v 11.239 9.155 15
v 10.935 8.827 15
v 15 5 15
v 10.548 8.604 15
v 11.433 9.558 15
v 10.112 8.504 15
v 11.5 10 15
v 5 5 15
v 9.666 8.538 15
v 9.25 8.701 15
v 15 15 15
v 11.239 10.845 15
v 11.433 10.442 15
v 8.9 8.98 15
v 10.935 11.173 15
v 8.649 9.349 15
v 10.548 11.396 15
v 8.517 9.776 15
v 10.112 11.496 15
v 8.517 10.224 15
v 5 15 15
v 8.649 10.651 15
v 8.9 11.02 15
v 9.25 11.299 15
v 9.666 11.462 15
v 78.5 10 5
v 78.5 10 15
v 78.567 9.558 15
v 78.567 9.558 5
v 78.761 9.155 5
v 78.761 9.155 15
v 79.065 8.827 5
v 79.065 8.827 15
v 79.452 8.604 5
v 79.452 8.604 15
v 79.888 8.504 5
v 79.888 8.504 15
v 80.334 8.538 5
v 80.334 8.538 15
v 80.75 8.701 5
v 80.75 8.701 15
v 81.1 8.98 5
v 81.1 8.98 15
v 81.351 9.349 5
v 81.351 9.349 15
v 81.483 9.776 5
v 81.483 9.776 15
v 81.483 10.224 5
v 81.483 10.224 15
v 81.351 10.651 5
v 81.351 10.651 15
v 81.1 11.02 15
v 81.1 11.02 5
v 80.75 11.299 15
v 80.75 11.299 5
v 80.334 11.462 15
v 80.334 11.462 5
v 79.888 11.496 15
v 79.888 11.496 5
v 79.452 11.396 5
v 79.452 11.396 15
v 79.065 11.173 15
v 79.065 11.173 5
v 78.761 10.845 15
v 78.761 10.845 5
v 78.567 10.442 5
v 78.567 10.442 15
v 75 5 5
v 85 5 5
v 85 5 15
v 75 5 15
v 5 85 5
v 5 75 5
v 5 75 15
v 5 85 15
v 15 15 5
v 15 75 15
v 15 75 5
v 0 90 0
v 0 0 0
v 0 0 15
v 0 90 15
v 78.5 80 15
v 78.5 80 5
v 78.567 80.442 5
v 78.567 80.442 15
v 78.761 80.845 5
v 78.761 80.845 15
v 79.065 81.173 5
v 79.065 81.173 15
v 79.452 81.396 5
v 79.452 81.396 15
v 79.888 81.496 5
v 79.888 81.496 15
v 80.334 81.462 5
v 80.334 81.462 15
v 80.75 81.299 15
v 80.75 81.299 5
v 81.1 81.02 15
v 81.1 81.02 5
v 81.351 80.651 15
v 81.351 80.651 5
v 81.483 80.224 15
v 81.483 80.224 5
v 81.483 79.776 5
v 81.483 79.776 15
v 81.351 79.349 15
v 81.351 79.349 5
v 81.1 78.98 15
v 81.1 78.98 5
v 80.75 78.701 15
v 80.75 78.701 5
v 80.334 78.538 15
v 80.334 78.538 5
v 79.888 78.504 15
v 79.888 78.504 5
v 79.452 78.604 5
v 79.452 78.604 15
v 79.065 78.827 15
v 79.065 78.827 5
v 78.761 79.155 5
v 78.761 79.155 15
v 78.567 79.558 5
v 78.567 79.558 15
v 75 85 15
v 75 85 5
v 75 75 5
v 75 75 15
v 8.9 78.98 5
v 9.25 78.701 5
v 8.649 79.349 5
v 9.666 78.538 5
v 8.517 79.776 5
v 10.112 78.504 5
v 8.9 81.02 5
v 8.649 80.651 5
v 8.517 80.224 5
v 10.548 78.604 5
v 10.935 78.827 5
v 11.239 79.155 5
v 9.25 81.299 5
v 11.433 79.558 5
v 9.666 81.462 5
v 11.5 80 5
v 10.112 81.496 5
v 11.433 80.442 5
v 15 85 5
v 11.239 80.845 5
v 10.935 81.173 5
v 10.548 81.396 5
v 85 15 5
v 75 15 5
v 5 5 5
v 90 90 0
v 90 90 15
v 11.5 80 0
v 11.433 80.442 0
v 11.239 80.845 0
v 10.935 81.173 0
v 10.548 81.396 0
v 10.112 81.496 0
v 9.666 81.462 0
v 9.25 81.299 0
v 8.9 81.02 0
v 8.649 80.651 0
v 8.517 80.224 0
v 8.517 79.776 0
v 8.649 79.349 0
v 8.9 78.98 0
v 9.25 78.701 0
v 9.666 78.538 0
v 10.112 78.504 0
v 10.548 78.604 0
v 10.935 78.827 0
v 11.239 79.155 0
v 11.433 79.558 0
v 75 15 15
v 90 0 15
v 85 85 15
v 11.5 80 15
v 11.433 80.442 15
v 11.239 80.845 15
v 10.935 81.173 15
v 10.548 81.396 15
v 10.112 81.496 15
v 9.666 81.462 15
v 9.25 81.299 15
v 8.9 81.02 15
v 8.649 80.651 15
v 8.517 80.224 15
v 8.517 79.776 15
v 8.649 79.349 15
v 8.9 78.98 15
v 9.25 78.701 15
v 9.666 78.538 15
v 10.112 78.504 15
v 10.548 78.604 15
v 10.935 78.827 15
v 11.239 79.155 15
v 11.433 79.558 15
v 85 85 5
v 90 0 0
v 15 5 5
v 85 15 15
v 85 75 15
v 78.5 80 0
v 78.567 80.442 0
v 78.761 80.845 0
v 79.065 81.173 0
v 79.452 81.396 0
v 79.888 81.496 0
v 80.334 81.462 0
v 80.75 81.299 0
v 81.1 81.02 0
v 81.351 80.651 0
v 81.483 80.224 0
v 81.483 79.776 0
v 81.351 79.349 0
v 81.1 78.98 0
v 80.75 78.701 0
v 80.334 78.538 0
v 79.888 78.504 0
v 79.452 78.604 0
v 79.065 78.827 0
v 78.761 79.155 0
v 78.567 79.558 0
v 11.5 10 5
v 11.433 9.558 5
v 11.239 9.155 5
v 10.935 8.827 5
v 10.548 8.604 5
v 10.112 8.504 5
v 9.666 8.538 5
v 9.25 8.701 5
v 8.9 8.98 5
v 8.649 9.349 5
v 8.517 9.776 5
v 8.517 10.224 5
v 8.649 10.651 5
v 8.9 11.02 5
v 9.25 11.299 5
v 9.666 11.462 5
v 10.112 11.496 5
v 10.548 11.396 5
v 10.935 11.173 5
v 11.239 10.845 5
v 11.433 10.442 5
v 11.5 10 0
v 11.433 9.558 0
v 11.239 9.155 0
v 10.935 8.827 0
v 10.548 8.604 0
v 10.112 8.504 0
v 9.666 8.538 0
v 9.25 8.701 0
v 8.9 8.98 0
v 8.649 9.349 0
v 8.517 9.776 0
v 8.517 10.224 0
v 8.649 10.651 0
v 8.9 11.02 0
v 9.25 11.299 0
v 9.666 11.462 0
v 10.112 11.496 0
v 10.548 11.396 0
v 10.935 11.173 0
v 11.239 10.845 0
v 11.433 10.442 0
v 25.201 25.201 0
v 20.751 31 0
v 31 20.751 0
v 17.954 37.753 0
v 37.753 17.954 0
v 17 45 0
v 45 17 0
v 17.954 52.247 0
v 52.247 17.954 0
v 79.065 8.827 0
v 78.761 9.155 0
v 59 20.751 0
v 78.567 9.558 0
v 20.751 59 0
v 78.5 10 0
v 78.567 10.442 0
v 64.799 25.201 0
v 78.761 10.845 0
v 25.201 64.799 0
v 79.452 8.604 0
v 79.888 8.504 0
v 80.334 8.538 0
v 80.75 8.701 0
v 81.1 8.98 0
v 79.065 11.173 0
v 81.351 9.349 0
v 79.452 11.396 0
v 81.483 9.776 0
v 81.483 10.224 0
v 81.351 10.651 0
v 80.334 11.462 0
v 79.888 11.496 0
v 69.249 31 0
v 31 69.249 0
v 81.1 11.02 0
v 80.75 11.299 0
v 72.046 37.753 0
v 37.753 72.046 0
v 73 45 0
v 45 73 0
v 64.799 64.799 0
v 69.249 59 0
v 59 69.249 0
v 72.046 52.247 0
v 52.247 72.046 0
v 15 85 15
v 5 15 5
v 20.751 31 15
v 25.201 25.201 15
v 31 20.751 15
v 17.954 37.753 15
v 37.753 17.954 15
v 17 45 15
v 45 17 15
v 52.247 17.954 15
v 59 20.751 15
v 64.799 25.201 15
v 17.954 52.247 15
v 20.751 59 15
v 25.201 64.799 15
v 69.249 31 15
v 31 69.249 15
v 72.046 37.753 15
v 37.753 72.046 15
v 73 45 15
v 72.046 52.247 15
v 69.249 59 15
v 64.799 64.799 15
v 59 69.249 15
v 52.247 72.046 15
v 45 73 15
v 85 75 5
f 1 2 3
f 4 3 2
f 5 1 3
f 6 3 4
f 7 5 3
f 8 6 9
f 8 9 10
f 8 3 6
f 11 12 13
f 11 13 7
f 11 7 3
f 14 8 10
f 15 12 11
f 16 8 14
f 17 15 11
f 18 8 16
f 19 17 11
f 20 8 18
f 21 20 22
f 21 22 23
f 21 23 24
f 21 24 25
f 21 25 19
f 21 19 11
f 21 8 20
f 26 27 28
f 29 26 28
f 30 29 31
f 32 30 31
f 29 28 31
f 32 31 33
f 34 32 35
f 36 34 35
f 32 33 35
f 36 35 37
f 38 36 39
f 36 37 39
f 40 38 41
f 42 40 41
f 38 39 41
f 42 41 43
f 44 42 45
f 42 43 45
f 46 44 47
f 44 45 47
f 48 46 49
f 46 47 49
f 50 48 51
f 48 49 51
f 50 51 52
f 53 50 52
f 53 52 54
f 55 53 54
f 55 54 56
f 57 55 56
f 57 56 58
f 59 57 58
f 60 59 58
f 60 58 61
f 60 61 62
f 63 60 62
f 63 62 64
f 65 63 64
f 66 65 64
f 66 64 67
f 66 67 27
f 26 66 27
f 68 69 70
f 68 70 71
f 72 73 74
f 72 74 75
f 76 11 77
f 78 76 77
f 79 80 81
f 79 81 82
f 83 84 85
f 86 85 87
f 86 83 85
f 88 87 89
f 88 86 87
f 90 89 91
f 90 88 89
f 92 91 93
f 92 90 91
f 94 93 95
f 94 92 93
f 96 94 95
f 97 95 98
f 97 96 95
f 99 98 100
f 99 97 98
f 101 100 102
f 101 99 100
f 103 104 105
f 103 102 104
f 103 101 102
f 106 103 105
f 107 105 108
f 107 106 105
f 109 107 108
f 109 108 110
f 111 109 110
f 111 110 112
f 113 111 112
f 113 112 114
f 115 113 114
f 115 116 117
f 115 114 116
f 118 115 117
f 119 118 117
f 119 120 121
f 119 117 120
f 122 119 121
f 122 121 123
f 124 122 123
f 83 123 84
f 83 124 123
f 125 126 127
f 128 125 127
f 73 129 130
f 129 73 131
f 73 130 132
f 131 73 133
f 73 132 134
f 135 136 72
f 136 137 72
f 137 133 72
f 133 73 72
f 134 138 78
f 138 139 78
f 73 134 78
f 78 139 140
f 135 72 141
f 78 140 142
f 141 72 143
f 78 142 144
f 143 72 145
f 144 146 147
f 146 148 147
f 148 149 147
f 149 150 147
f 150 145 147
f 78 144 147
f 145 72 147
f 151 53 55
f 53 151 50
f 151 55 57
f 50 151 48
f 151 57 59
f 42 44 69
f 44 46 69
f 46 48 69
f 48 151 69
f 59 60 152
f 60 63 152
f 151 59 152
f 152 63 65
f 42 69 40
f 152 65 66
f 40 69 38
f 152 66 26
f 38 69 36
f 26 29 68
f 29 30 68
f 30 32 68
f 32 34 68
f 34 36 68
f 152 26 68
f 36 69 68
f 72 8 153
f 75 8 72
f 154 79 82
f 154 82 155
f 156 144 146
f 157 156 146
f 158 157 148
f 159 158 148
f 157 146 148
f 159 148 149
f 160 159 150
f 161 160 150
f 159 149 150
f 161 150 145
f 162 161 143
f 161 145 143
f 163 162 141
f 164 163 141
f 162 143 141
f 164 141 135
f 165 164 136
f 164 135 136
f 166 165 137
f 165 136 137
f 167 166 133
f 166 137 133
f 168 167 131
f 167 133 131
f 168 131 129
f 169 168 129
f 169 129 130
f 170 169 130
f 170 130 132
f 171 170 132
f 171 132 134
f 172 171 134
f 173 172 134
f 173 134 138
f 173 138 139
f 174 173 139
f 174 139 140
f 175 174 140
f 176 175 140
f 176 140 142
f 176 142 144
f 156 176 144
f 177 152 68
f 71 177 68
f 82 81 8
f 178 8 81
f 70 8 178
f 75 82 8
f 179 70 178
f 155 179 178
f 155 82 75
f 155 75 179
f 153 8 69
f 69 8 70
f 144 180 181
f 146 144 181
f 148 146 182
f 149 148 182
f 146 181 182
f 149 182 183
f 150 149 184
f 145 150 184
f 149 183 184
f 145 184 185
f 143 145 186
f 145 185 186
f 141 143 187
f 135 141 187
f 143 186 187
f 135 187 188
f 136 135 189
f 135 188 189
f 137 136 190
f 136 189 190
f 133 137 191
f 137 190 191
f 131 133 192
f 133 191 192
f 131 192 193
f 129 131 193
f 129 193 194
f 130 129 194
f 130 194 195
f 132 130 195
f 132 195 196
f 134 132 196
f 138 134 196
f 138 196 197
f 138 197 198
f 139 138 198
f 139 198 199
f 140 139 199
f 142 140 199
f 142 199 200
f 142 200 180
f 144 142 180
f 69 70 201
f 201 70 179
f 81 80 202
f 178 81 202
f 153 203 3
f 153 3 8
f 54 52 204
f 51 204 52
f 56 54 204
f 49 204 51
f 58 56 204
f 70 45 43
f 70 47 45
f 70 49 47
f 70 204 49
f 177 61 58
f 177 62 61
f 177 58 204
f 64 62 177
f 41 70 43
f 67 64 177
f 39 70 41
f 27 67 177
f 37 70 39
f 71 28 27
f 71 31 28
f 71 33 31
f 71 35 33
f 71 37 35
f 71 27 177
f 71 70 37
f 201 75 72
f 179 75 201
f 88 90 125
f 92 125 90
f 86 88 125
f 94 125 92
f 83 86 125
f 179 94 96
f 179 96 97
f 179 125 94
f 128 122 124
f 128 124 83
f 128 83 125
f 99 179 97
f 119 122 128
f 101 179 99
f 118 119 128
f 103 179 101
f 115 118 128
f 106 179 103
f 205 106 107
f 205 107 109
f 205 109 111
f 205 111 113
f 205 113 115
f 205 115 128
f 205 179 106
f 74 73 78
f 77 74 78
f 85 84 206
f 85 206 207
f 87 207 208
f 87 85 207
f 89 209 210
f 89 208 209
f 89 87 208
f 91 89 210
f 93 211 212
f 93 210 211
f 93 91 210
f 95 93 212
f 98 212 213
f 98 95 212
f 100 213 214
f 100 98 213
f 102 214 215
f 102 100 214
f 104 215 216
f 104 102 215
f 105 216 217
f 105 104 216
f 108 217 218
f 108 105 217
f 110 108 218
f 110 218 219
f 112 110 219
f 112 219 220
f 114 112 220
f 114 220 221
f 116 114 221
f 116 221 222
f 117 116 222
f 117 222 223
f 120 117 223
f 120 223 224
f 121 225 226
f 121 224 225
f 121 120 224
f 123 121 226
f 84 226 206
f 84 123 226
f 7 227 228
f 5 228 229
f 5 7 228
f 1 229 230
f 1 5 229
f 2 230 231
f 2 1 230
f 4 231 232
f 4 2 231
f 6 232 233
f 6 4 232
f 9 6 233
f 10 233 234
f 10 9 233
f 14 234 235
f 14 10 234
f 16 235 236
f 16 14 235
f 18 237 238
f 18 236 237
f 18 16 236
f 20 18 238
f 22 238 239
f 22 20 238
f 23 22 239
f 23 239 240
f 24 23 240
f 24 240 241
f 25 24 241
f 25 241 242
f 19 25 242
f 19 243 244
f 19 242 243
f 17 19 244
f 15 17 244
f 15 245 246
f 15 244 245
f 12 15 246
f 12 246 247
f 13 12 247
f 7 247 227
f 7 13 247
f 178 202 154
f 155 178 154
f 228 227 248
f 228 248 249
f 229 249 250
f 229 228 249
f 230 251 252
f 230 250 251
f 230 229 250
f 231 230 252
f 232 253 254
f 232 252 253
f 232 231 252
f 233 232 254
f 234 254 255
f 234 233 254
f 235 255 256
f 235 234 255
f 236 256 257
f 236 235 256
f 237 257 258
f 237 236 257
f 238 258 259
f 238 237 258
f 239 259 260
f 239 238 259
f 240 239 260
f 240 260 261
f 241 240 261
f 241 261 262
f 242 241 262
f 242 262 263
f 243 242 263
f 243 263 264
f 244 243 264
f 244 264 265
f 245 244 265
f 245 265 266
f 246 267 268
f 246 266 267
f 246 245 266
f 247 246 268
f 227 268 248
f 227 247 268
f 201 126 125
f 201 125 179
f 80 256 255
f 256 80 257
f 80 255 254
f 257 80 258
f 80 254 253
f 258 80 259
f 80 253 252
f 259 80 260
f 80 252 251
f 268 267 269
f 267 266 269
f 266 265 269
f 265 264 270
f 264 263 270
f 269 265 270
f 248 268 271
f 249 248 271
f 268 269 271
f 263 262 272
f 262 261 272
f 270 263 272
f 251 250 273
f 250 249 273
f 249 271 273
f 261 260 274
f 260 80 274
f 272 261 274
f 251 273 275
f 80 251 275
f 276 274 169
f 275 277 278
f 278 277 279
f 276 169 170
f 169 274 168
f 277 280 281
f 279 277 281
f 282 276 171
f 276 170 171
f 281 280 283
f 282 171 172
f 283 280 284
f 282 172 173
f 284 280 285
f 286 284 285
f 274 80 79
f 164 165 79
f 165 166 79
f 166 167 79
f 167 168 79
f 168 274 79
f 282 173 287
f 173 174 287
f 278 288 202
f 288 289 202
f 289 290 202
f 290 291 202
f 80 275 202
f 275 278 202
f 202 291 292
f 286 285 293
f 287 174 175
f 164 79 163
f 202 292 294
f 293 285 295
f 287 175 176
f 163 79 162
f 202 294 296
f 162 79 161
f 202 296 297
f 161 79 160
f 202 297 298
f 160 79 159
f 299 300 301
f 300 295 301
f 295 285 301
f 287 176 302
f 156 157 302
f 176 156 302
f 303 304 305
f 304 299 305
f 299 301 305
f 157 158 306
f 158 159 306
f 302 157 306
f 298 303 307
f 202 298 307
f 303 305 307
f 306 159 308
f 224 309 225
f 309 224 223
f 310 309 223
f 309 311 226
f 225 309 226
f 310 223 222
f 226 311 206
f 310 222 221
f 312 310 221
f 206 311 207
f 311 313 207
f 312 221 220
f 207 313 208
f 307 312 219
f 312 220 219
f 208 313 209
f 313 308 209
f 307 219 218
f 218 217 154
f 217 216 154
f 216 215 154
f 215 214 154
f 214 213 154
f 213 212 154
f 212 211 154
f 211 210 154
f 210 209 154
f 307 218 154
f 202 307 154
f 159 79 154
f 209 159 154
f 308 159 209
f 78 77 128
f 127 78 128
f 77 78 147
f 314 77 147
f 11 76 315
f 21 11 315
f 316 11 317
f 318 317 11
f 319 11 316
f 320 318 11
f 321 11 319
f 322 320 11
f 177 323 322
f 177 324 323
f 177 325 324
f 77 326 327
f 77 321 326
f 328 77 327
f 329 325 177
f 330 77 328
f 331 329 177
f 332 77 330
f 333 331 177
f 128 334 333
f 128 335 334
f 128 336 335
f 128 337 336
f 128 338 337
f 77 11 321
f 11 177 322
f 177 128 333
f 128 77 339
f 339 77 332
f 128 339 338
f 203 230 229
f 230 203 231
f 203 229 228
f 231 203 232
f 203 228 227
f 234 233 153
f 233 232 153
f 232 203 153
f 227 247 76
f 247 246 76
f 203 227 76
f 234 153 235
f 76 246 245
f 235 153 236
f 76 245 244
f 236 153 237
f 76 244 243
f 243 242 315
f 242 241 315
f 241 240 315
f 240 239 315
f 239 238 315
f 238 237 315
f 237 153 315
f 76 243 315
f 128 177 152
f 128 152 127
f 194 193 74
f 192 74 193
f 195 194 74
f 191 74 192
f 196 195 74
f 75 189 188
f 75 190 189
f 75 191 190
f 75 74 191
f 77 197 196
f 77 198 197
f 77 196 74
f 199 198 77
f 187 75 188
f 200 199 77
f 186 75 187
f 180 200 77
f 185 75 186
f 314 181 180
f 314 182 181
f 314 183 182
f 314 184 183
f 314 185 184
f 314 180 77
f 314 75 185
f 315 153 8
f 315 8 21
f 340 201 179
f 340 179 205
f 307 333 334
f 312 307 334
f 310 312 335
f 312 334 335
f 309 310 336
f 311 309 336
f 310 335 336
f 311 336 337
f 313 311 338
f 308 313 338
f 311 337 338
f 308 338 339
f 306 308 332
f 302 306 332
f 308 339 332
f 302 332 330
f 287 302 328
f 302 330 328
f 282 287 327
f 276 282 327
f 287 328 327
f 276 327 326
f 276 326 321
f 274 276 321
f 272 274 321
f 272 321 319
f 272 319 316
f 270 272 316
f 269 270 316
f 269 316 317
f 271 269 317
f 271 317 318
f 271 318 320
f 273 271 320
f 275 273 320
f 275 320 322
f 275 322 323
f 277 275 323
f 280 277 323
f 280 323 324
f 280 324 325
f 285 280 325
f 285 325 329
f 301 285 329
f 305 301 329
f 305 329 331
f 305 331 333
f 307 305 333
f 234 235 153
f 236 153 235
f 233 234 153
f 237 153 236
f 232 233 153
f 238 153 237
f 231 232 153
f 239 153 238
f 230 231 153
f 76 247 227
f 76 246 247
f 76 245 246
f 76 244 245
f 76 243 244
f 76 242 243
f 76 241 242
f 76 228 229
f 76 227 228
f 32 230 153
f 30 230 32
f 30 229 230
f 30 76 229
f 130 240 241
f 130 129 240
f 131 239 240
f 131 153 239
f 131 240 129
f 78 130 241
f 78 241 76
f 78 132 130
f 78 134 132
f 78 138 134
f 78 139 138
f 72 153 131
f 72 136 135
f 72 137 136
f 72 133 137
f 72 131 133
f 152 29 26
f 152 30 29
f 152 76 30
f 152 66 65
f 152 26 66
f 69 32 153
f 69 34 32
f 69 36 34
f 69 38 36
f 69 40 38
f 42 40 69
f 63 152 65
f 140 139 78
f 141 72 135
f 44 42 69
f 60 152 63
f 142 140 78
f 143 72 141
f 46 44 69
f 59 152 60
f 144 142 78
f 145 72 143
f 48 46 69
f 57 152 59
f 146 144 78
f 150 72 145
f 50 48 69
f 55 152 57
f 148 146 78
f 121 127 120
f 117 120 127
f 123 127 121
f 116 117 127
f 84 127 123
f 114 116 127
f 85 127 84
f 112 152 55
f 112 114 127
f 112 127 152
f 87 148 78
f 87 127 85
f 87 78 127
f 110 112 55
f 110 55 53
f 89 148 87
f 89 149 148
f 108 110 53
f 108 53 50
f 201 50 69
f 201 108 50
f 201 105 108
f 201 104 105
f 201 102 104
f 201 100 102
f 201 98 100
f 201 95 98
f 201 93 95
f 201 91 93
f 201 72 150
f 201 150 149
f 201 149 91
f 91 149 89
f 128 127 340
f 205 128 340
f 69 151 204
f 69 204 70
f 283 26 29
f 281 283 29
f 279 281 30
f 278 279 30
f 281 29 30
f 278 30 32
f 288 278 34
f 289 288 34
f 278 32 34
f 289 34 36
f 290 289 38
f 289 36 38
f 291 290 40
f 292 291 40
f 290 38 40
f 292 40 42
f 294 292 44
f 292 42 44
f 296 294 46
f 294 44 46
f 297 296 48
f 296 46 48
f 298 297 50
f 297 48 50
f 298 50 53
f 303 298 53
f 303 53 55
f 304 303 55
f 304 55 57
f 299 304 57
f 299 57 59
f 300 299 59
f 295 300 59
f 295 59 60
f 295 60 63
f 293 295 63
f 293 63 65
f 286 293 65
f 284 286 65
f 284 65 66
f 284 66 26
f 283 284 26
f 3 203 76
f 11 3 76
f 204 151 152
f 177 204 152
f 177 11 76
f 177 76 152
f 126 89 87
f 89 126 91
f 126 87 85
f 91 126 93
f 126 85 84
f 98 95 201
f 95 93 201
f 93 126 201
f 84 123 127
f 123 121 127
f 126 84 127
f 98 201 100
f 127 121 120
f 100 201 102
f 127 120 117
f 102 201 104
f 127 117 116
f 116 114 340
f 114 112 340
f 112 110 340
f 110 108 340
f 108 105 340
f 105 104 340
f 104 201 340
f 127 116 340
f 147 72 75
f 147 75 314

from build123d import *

# Parameters (mm, degrees)
SKETCH2_W               = 90
SKETCH2_H               = 90
BOSS_EXTRUDE1_DEPTH     = 15
SKETCH3_W               = 80
SKETCH3_H               = 80
SKETCH3_W_2             = 60
SKETCH3_H_2             = 60
CUT_EXTRUDE1_DEPTH      = 10
SKETCH4_W               = 10
SKETCH4_H               = 10
BOSS_EXTRUDE5_DEPTH     = 10
CIRPATTERN3_COUNT       = 4
SKETCH5_R               = 28
CUT_EXTRUDE2_DEPTH      = 129.16005618
SKETCH6_R               = 1.5
CUT_EXTRUDE3_DEPTH      = 129.16005618
MIRROR2_COPY_1_SKETCH_R = 1.5
MIRROR2_COPY_1_DEPTH    = 129.16005618


with BuildPart() as part:
    # Sketch2 → Boss-Extrude1 (new body)
    with BuildSketch(Plane.XY):
        with Locations((45, 45)):
            Rectangle(SKETCH2_W, SKETCH2_H)
    extrude(amount=BOSS_EXTRUDE1_DEPTH)

    # Sketch3 → Cut-Extrude1 (cut)
    with BuildSketch(Plane.XY.offset(15)):
        with Locations((45, 45)):
            Rectangle(SKETCH3_W, SKETCH3_H)
        with Locations((45, 45)):
            Rectangle(SKETCH3_W_2, SKETCH3_H_2, mode=Mode.SUBTRACT)
    extrude(amount=-CUT_EXTRUDE1_DEPTH, mode=Mode.SUBTRACT)

    # Sketch5 → Cut-Extrude2 (cut, through all)
    with BuildSketch(Plane.XY.offset(15)):
        with Locations((45, 45)):
            Circle(SKETCH5_R)
    extrude(amount=-CUT_EXTRUDE2_DEPTH, mode=Mode.SUBTRACT)


with BuildPart() as body_2:
    # Sketch4 → Boss-Extrude5 (new, through all)
    with BuildSketch(Plane.XY.offset(5)):
        with Locations((10, 80)):
            Rectangle(SKETCH4_W, SKETCH4_H)
    extrude(amount=BOSS_EXTRUDE5_DEPTH)


with BuildPart() as cirpattern3_1:
    # CirPattern3: pattern copy
    add(body_2.part.rotate(Axis((45, 45, 0), (0, 0, 1)), 1 * 360 / CIRPATTERN3_COUNT))


with BuildPart() as cirpattern3_2:
    # CirPattern3: pattern copy
    add(body_2.part.rotate(Axis((45, 45, 0), (0, 0, 1)), 2 * 360 / CIRPATTERN3_COUNT))


with BuildPart() as cirpattern3_3:
    # CirPattern3: pattern copy
    add(body_2.part.rotate(Axis((45, 45, 0), (0, 0, 1)), 3 * 360 / CIRPATTERN3_COUNT))


with BuildPart() as cut_extrude3_tool:
    # Sketch6 → Cut-Extrude3 (new, through all)
    with BuildSketch(Plane.XY.offset(15)):
        with Locations((10, 80)):
            Circle(SKETCH6_R)
    cut_extrude3 = extrude(amount=-CUT_EXTRUDE3_DEPTH)


with BuildPart() as part_1:
    add(part.part)

    # Cut-Extrude3: cut by cut_extrude3_tool
    add(cut_extrude3_tool.part, mode=Mode.SUBTRACT)


with BuildPart() as body_2_1:
    add(body_2.part)

    # Cut-Extrude3: cut by cut_extrude3_tool
    add(cut_extrude3_tool.part, mode=Mode.SUBTRACT)


with BuildPart() as mirror1_tool:
    # Mirror1: Cut-Extrude3 across plane
    add(cut_extrude3.mirror(Plane(origin=(0, 45, 0), x_dir=(0, 0, 1), z_dir=(0, -1, 0))))


with BuildPart() as part_2:
    add(part_1.part)

    # Mirror1: cut by mirror1_tool
    add(mirror1_tool.part, mode=Mode.SUBTRACT)


with BuildPart() as cirpattern3_1_1:
    add(cirpattern3_1.part)

    # Mirror1: cut by mirror1_tool
    add(mirror1_tool.part, mode=Mode.SUBTRACT)


with BuildPart() as mirror2_tool:
    # Mirror2: Cut-Extrude3 across plane
    add(cut_extrude3.mirror(Plane.ZY.offset(-45)))


with BuildPart() as part_3:
    add(part_2.part)

    # Mirror2: cut by mirror2_tool
    add(mirror2_tool.part, mode=Mode.SUBTRACT)


with BuildPart() as cirpattern3_3_1:
    add(cirpattern3_3.part)

    # Mirror2: cut by mirror2_tool
    add(mirror2_tool.part, mode=Mode.SUBTRACT)


with BuildPart() as mirror2_copy_1_tool:
    # Mirror2 copy 1 sketch → Mirror2 copy 1 (new, through all)
    with BuildSketch(Plane(origin=(90, 90, 15), x_dir=(-1, 0, 0), z_dir=(0, 0, 1))):
        with Locations((10, 80)):
            Circle(MIRROR2_COPY_1_SKETCH_R)
    extrude(amount=-MIRROR2_COPY_1_DEPTH)


with BuildPart() as part_4:
    add(part_3.part)

    # Mirror2 copy 1: cut by mirror2_copy_1_tool
    add(mirror2_copy_1_tool.part, mode=Mode.SUBTRACT)


with BuildPart() as cirpattern3_2_1:
    add(cirpattern3_2.part)

    # Mirror2 copy 1: cut by mirror2_copy_1_tool
    add(mirror2_copy_1_tool.part, mode=Mode.SUBTRACT)


solid = Compound([body_2_1.part, cirpattern3_1_1.part, cirpattern3_3_1.part, part_4.part, cirpattern3_2_1.part])
